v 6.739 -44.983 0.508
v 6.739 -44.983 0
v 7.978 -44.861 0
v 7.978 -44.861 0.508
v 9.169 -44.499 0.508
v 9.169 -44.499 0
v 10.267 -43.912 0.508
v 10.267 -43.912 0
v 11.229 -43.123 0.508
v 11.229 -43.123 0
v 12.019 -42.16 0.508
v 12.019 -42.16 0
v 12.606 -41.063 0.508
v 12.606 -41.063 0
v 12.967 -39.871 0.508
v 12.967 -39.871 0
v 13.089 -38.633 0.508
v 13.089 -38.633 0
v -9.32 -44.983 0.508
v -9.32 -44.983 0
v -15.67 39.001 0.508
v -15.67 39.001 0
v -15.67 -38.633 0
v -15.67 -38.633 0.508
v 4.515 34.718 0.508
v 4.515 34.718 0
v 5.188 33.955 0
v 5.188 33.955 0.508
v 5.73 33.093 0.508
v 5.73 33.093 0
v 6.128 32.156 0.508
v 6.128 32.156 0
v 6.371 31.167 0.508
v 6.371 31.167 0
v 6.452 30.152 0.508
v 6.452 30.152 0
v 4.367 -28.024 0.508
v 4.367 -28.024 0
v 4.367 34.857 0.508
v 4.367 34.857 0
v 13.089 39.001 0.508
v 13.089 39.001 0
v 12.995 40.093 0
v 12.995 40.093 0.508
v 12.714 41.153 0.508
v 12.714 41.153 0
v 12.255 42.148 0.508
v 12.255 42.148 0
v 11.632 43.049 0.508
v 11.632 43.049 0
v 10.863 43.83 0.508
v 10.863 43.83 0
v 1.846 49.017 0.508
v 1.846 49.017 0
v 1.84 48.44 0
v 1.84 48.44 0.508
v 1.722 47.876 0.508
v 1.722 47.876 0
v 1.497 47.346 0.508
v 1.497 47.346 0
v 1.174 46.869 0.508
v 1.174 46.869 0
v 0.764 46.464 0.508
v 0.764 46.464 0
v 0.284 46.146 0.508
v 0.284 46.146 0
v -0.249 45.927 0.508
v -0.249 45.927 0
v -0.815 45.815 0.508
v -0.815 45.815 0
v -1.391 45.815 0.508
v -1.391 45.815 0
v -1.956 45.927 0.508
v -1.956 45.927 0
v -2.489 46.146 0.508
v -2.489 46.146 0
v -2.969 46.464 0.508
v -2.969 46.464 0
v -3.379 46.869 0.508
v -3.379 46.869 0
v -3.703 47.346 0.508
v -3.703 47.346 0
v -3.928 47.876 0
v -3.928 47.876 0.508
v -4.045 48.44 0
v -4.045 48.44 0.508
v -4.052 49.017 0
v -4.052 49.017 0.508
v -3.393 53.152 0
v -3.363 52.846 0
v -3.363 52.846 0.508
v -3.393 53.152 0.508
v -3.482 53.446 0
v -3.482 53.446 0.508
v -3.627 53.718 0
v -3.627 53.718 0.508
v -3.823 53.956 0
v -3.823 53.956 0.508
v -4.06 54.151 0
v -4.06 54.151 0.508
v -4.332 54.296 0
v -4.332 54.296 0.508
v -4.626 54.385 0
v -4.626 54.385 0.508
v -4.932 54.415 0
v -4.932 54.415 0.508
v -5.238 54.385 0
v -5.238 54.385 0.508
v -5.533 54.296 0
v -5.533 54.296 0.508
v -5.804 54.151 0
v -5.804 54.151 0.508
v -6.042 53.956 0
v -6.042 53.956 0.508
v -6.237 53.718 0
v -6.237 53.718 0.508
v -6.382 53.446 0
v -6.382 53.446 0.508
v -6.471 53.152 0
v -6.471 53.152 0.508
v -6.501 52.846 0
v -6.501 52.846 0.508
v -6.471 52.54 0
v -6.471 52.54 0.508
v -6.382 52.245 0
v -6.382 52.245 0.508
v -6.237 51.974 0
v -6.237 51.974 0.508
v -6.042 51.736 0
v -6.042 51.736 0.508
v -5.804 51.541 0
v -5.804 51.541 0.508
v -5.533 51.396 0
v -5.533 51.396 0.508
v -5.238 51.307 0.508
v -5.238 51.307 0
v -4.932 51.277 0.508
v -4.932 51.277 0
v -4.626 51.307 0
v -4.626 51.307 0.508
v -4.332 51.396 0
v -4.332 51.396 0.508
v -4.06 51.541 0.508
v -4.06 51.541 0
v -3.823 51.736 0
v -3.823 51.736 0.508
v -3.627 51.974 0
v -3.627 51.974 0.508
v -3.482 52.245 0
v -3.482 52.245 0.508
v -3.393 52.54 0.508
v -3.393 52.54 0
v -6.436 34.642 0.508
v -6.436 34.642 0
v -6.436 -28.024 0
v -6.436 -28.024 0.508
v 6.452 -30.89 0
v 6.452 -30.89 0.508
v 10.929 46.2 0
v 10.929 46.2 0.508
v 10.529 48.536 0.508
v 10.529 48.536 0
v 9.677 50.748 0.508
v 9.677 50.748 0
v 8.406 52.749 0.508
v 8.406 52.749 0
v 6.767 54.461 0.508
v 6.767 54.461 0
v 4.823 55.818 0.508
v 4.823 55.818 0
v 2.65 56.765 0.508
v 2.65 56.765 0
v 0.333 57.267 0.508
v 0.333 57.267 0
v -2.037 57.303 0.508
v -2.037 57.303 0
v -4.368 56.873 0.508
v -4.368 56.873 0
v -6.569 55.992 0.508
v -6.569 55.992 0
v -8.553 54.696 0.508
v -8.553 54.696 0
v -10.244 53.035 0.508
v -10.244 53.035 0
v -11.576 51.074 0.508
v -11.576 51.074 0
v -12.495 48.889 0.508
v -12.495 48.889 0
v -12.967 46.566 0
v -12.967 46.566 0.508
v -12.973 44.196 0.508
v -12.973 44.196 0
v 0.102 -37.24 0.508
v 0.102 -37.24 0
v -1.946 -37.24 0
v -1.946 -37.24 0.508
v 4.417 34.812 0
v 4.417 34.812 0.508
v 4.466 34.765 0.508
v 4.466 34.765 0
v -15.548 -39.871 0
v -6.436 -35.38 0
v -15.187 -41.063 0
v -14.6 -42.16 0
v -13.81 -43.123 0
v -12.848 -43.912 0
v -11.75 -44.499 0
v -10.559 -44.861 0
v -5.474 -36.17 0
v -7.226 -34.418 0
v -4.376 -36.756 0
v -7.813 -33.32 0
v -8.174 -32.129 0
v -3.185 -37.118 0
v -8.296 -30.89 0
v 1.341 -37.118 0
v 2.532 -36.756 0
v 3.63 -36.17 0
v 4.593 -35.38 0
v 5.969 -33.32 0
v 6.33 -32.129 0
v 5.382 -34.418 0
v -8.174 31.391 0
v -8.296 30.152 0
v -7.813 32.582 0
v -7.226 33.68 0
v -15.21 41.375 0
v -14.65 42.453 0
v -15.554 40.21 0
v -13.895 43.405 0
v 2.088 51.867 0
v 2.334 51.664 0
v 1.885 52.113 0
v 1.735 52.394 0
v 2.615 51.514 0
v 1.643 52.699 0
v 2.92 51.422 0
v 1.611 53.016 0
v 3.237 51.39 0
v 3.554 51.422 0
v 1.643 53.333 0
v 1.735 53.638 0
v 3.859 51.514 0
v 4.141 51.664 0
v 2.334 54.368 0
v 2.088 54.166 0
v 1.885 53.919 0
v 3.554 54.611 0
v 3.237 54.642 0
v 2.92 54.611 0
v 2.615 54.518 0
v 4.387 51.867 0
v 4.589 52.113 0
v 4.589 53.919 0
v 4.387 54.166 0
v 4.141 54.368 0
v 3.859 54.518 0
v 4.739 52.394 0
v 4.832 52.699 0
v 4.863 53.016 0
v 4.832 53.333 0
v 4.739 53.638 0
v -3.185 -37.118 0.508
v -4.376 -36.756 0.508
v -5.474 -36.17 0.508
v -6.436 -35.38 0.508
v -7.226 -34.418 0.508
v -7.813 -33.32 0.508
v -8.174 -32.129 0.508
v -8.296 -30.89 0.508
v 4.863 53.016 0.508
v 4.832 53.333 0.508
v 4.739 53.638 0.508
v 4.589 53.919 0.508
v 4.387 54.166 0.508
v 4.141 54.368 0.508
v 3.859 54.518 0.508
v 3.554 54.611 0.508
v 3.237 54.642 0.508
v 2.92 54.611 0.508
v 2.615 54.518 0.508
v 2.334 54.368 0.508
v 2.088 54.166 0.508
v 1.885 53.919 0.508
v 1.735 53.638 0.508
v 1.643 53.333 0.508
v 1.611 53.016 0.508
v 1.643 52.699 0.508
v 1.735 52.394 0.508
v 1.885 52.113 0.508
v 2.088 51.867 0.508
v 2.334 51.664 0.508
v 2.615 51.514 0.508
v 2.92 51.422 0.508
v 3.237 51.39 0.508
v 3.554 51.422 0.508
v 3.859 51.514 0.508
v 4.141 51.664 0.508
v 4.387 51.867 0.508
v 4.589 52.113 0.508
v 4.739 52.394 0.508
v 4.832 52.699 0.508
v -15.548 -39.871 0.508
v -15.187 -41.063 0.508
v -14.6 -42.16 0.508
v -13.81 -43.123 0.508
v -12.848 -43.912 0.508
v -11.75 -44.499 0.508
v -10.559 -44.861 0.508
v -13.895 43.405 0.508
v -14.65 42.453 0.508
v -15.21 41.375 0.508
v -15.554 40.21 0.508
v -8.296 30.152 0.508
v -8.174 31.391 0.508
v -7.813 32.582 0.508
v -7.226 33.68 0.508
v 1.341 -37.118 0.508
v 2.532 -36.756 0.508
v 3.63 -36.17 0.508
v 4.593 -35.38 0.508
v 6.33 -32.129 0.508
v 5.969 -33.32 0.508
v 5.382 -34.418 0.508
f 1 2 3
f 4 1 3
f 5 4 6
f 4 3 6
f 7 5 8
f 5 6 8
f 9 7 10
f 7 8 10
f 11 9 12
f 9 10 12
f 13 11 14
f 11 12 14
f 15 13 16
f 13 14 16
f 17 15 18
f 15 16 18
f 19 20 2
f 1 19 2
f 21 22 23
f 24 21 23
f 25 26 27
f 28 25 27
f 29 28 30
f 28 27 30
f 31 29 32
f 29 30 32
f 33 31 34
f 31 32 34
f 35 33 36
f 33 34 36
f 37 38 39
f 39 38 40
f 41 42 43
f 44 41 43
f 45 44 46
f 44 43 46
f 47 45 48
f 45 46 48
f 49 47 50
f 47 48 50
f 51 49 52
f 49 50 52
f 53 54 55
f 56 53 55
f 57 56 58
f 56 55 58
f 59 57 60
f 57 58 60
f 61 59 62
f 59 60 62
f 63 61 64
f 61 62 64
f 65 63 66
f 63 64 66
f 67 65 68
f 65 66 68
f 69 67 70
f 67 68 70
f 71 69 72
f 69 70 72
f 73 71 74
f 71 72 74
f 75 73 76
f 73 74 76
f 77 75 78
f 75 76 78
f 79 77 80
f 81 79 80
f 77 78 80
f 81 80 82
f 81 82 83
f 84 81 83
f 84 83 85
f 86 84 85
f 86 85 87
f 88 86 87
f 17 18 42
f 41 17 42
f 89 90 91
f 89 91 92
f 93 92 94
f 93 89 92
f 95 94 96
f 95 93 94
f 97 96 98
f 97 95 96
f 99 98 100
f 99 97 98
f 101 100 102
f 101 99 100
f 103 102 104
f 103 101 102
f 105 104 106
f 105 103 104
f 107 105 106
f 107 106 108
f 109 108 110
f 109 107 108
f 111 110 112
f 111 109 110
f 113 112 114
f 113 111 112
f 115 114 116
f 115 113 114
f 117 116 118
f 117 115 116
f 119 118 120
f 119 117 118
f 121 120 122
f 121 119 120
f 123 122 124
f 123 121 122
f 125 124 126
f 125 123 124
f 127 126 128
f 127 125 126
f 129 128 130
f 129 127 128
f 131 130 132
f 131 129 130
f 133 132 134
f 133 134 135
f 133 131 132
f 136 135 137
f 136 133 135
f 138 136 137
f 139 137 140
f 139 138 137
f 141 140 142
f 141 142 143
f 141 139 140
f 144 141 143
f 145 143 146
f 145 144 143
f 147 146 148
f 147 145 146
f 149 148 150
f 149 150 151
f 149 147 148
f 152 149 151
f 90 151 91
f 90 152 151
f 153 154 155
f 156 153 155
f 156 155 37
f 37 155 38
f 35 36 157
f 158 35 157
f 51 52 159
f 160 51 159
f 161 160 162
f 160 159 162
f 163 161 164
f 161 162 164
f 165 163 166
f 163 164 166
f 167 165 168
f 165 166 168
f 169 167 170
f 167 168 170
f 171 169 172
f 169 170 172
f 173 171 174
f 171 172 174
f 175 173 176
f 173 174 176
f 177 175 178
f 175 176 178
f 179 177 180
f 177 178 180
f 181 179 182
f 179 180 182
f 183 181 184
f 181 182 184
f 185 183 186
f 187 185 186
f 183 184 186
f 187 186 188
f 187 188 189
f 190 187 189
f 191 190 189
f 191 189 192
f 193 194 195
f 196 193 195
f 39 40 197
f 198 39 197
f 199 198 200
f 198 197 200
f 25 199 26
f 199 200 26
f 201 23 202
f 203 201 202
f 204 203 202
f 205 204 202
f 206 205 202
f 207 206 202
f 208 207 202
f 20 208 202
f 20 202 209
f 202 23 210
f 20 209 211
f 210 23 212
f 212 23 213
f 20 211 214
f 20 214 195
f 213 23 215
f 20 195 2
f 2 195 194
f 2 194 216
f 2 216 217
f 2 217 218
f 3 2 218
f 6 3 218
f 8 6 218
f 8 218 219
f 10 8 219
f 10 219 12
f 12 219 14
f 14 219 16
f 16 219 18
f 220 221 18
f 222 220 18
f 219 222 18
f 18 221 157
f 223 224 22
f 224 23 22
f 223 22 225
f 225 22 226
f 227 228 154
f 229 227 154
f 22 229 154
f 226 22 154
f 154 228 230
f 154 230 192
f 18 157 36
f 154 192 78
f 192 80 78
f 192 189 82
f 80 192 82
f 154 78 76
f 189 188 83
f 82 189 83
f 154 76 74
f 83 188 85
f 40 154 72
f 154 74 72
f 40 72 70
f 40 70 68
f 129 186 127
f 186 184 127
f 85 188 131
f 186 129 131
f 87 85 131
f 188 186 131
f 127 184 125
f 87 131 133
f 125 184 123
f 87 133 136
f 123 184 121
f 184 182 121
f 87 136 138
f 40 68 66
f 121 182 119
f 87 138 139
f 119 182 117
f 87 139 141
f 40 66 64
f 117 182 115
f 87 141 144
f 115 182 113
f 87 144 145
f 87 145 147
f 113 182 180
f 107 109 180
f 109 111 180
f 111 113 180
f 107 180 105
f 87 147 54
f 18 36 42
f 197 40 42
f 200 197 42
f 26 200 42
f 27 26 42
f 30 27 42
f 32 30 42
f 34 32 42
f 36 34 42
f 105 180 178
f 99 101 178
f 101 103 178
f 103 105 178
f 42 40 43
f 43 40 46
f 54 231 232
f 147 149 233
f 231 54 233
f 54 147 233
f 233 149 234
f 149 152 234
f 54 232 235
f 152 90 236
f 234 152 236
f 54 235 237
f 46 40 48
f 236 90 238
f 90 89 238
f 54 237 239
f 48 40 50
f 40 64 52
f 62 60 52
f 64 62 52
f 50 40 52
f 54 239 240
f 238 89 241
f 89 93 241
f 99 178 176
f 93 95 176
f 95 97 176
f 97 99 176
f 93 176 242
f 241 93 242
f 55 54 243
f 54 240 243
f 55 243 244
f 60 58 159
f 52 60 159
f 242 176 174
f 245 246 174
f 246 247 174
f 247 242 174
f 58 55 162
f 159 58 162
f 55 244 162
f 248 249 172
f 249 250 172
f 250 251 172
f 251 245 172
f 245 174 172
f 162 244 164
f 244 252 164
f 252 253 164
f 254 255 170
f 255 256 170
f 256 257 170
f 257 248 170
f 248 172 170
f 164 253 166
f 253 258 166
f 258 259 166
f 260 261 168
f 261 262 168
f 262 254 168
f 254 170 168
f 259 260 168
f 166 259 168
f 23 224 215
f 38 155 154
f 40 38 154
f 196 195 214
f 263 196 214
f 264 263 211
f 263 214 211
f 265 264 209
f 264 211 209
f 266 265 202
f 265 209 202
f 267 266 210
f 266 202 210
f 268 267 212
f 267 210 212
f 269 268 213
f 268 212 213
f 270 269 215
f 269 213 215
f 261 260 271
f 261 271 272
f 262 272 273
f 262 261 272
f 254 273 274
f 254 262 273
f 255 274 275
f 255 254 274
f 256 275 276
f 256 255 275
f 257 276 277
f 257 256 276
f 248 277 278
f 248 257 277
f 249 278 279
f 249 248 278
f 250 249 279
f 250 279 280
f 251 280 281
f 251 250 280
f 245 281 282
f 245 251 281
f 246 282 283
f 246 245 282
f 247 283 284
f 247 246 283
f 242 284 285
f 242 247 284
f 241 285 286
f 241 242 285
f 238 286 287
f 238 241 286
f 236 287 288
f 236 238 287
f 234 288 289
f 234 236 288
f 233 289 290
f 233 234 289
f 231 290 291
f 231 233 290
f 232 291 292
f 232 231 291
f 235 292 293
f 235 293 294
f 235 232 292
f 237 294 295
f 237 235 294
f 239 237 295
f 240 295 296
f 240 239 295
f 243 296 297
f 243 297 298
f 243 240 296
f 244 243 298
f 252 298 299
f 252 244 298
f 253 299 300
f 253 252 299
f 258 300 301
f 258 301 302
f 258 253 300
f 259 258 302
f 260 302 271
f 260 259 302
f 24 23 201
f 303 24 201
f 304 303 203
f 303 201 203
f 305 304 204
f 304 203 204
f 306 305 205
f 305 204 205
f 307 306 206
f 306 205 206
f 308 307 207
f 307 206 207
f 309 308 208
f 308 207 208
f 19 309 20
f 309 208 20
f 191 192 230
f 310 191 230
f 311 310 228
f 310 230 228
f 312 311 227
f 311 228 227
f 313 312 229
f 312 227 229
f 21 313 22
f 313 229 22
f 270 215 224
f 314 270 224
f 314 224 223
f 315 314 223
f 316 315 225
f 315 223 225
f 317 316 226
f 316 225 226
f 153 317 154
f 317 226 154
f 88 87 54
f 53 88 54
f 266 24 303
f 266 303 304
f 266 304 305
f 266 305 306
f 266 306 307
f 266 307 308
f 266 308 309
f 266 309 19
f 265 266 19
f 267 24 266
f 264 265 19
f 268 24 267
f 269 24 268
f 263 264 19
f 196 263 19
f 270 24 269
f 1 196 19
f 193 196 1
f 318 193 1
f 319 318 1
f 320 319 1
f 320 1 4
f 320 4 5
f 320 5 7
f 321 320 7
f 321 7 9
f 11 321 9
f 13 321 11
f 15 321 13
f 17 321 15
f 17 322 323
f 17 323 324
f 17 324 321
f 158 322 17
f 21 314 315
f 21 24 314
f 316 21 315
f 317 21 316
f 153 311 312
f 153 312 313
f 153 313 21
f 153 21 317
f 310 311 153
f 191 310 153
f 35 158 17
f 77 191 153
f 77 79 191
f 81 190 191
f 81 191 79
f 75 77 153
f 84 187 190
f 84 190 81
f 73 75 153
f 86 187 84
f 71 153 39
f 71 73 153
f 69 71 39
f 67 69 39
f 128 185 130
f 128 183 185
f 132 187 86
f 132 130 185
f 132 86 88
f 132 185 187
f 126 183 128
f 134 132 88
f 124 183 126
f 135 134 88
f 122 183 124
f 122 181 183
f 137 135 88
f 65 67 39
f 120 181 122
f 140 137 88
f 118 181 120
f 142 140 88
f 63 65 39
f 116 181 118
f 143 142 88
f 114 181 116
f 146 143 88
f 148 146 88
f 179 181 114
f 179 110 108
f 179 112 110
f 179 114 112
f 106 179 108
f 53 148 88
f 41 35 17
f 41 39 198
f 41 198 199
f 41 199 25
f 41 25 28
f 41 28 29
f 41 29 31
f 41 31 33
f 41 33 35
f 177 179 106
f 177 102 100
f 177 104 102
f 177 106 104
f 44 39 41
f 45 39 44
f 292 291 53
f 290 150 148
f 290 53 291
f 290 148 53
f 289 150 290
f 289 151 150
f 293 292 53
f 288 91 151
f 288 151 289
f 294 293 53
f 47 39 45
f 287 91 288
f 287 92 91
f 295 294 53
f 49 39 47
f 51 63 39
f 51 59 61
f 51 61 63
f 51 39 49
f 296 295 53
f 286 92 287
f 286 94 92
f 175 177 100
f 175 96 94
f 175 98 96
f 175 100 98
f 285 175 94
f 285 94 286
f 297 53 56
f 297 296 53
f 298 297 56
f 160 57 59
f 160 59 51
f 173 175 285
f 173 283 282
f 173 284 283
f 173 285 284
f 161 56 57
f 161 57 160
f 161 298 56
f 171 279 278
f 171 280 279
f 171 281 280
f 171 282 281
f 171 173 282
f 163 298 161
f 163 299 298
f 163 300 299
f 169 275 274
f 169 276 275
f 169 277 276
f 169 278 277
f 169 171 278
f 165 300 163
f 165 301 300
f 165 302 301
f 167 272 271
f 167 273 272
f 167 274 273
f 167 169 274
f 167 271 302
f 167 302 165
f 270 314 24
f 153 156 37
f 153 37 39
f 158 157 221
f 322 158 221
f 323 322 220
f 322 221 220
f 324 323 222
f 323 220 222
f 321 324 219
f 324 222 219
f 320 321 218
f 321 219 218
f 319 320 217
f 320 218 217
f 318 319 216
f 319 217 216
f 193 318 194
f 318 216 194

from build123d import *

# Parameters (mm, degrees)
F0_R     = 1.569142
F0_R_2   = 1.625806
F1_DEPTH = 0.508


with BuildPart() as f1:
    # F0 (on Top) → F1 (new body)
    with BuildSketch(Plane.XY):
        with BuildLine():
            Line((-6.436094, 45.351289), (-9.320162, 45.351289))
            ThreePointArc((-9.320162, 45.351289), (-11.235743, 45.055465), (-12.972845, 44.195556))
            ThreePointArc((-12.972845, 44.195556), (-14.955631, 41.927717), (-15.670162, 39.001289))
            Line((-15.670162, 39.001289), (-15.670162, -38.632582))
            ThreePointArc((-15.670162, -38.632582), (-13.81029, -43.12271), (-9.320162, -44.982582))
            Line((-9.320162, -44.982582), (6.739195, -44.982582))
            ThreePointArc((6.739195, -44.982582), (11.229323, -43.12271), (13.089195, -38.632582))
            Line((13.089195, -38.632582), (13.089195, 39.001289))
            ThreePointArc((13.089195, 39.001289), (12.505726, 41.660164), (10.862544, 43.830419))
            ThreePointArc((10.862544, 43.830419), (8.93664, 44.958951), (6.739195, 45.351289))
            Line((6.739195, 45.351289), (4.366797, 45.351289))
            Line((4.366797, 45.351289), (-6.436094, 45.351289))
        make_face()
        with BuildLine():
            Line((0.10242, -37.239678), (-1.945966, -37.239678))
            ThreePointArc((-1.945966, -37.239678), (-6.436094, -35.379806), (-8.295966, -30.889678))
            Line((-8.295966, -30.889678), (-8.295966, 30.152257))
            ThreePointArc((-8.295966, 30.152257), (-7.812601, 32.582297), (-6.436094, 34.642385))
            Line((-6.436094, 34.642385), (-6.436094, 26.376916))
            Line((-6.436094, 26.376916), (-6.436094, -28.02352))
            Line((-6.436094, -28.02352), (4.366797, -28.02352))
            Line((4.366797, -28.02352), (4.366797, 26.376916))
            Line((4.366797, 26.376916), (4.366797, 34.642385))
            Line((4.366797, 34.642385), (4.366797, 34.857317))
            ThreePointArc((4.366797, 34.857317), (4.441516, 34.7885), (4.515124, 34.718497))
            ThreePointArc((4.515124, 34.718497), (5.948067, 32.632361), (6.45242, 30.152257))
            Line((6.45242, 30.152257), (6.45242, -30.889678))
            ThreePointArc((6.45242, -30.889678), (4.592548, -35.379806), (0.10242, -37.239678))
        make_face(mode=Mode.SUBTRACT)
        with BuildLine():
            ThreePointArc((-12.972845, 44.195556), (-11.235743, 45.055465), (-9.320162, 45.351289))
            Line((-9.320162, 45.351289), (-6.436094, 45.351289))
            Line((-6.436094, 45.351289), (4.366797, 45.351289))
            Line((4.366797, 45.351289), (6.739195, 45.351289))
            ThreePointArc((6.739195, 45.351289), (8.93664, 44.958951), (10.862544, 43.830419))
            ThreePointArc((10.862544, 43.830419), (-0.850933, 57.343891), (-12.972845, 44.195556))
        make_face()
        with Locations((-4.932173, 52.845966)):
            Circle(F0_R, mode=Mode.SUBTRACT)
        with BuildLine():
            ThreePointArc((1.846396, 49.016528), (-1.102735, 45.801074), (-4.051865, 49.016528))
            Line((-4.051865, 49.016528), (1.846396, 49.016528))
        make_face(mode=Mode.SUBTRACT)
        with Locations((3.237295, 53.016163)):
            Circle(F0_R_2, mode=Mode.SUBTRACT)
    extrude(amount=F1_DEPTH)


solid = f1.part
